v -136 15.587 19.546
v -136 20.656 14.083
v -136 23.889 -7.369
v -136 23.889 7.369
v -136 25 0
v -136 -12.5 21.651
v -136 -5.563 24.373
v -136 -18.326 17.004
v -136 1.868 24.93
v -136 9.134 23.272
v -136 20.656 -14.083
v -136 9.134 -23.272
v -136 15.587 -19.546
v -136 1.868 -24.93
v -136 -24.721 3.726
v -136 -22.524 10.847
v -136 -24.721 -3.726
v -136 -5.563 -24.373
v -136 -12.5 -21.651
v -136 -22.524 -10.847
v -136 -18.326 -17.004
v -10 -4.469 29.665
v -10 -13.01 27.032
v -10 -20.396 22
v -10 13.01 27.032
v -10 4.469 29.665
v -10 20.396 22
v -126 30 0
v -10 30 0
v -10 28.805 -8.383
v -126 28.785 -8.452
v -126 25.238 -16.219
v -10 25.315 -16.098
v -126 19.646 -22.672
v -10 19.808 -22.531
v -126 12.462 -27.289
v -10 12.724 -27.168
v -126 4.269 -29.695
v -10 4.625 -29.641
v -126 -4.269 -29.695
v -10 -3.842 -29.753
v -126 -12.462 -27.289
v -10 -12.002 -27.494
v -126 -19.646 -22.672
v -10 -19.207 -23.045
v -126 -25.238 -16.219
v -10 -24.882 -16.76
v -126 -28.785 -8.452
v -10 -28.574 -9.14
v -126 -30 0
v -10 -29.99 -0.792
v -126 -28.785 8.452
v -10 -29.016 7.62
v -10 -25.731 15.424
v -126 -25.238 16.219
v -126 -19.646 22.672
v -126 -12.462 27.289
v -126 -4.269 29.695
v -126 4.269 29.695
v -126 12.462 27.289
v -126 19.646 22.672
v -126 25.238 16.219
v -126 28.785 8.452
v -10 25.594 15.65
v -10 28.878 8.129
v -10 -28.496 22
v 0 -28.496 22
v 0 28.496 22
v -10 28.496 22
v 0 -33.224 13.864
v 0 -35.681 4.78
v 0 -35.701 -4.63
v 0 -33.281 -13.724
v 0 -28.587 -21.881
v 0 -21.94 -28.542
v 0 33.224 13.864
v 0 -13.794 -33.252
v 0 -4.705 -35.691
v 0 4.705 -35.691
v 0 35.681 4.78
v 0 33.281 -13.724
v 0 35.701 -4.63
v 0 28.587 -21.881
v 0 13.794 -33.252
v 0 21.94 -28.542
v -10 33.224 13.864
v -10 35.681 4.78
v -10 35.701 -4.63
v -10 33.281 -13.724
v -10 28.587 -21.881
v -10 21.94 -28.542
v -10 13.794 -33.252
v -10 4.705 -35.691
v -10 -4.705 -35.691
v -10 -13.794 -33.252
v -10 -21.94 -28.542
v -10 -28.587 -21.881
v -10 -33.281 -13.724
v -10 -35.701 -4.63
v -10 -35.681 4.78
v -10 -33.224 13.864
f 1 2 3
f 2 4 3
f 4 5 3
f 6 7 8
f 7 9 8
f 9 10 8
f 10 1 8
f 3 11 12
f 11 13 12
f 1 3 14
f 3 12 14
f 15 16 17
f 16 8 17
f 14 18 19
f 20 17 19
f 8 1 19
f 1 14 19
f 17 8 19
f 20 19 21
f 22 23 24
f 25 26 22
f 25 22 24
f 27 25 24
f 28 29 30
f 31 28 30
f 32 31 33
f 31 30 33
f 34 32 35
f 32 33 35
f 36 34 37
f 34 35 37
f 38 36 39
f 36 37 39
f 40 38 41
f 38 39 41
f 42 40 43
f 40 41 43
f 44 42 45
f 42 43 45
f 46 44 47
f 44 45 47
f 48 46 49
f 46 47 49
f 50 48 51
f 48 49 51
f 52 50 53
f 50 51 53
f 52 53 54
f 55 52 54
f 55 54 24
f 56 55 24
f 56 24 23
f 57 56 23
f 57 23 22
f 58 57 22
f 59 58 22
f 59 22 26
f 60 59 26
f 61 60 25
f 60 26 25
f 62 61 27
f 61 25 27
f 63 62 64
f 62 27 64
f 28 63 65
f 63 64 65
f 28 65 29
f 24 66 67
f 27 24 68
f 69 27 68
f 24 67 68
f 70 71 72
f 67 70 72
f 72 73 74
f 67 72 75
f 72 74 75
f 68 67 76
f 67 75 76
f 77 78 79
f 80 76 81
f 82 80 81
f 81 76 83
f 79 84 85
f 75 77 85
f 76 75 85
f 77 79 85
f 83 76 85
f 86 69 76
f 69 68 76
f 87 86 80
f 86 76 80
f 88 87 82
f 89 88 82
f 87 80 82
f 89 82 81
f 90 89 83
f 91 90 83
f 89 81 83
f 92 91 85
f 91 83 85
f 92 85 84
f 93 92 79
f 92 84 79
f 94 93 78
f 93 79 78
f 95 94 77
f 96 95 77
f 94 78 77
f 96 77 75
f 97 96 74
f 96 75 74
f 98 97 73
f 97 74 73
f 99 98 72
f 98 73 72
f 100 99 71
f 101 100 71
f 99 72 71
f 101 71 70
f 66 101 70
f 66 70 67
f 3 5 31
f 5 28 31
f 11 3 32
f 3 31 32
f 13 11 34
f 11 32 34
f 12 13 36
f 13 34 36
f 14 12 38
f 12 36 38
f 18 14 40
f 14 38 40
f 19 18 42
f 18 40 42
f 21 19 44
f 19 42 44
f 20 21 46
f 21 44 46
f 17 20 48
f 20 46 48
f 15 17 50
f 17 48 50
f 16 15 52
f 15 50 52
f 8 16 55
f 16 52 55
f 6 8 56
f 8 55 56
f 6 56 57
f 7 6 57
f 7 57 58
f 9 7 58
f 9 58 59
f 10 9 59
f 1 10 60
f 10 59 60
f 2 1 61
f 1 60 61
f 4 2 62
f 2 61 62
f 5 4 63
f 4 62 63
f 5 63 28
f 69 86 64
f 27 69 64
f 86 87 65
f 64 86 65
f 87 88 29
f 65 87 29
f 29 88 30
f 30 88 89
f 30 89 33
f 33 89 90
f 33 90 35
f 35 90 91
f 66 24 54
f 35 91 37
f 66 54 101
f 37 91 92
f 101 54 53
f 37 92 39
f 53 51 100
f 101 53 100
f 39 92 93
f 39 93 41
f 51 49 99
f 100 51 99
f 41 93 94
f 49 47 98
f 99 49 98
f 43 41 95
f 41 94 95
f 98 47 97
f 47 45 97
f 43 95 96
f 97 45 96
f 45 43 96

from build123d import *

# Parameters (mm, degrees)
SKETCH_2_W          = 14
SKETCH_2_H          = 72
CUT_EXTRUDE_1_DEPTH = 10


with BuildPart() as part:
    # 草图1 → 旋转1 (revolve)
    with BuildSketch(Plane.XY):
        Polygon((0, 0), (-136, 0), (-136, 25), (-126, 30), (-10, 30), (-10, 36), (0, 36), align=None)
    revolve(axis=Axis((0, 0, 0), (-1, 0, 0)))

    # 草图2 → 切除-拉伸1 (cut)
    with BuildSketch(Plane(origin=(0, 0, 0), x_dir=(0, 0, -1), z_dir=(1, 0, 0))):
        with Locations((-29, 0)):
            Rectangle(SKETCH_2_W, SKETCH_2_H)
    extrude(amount=-CUT_EXTRUDE_1_DEPTH, mode=Mode.SUBTRACT)


solid = part.part
